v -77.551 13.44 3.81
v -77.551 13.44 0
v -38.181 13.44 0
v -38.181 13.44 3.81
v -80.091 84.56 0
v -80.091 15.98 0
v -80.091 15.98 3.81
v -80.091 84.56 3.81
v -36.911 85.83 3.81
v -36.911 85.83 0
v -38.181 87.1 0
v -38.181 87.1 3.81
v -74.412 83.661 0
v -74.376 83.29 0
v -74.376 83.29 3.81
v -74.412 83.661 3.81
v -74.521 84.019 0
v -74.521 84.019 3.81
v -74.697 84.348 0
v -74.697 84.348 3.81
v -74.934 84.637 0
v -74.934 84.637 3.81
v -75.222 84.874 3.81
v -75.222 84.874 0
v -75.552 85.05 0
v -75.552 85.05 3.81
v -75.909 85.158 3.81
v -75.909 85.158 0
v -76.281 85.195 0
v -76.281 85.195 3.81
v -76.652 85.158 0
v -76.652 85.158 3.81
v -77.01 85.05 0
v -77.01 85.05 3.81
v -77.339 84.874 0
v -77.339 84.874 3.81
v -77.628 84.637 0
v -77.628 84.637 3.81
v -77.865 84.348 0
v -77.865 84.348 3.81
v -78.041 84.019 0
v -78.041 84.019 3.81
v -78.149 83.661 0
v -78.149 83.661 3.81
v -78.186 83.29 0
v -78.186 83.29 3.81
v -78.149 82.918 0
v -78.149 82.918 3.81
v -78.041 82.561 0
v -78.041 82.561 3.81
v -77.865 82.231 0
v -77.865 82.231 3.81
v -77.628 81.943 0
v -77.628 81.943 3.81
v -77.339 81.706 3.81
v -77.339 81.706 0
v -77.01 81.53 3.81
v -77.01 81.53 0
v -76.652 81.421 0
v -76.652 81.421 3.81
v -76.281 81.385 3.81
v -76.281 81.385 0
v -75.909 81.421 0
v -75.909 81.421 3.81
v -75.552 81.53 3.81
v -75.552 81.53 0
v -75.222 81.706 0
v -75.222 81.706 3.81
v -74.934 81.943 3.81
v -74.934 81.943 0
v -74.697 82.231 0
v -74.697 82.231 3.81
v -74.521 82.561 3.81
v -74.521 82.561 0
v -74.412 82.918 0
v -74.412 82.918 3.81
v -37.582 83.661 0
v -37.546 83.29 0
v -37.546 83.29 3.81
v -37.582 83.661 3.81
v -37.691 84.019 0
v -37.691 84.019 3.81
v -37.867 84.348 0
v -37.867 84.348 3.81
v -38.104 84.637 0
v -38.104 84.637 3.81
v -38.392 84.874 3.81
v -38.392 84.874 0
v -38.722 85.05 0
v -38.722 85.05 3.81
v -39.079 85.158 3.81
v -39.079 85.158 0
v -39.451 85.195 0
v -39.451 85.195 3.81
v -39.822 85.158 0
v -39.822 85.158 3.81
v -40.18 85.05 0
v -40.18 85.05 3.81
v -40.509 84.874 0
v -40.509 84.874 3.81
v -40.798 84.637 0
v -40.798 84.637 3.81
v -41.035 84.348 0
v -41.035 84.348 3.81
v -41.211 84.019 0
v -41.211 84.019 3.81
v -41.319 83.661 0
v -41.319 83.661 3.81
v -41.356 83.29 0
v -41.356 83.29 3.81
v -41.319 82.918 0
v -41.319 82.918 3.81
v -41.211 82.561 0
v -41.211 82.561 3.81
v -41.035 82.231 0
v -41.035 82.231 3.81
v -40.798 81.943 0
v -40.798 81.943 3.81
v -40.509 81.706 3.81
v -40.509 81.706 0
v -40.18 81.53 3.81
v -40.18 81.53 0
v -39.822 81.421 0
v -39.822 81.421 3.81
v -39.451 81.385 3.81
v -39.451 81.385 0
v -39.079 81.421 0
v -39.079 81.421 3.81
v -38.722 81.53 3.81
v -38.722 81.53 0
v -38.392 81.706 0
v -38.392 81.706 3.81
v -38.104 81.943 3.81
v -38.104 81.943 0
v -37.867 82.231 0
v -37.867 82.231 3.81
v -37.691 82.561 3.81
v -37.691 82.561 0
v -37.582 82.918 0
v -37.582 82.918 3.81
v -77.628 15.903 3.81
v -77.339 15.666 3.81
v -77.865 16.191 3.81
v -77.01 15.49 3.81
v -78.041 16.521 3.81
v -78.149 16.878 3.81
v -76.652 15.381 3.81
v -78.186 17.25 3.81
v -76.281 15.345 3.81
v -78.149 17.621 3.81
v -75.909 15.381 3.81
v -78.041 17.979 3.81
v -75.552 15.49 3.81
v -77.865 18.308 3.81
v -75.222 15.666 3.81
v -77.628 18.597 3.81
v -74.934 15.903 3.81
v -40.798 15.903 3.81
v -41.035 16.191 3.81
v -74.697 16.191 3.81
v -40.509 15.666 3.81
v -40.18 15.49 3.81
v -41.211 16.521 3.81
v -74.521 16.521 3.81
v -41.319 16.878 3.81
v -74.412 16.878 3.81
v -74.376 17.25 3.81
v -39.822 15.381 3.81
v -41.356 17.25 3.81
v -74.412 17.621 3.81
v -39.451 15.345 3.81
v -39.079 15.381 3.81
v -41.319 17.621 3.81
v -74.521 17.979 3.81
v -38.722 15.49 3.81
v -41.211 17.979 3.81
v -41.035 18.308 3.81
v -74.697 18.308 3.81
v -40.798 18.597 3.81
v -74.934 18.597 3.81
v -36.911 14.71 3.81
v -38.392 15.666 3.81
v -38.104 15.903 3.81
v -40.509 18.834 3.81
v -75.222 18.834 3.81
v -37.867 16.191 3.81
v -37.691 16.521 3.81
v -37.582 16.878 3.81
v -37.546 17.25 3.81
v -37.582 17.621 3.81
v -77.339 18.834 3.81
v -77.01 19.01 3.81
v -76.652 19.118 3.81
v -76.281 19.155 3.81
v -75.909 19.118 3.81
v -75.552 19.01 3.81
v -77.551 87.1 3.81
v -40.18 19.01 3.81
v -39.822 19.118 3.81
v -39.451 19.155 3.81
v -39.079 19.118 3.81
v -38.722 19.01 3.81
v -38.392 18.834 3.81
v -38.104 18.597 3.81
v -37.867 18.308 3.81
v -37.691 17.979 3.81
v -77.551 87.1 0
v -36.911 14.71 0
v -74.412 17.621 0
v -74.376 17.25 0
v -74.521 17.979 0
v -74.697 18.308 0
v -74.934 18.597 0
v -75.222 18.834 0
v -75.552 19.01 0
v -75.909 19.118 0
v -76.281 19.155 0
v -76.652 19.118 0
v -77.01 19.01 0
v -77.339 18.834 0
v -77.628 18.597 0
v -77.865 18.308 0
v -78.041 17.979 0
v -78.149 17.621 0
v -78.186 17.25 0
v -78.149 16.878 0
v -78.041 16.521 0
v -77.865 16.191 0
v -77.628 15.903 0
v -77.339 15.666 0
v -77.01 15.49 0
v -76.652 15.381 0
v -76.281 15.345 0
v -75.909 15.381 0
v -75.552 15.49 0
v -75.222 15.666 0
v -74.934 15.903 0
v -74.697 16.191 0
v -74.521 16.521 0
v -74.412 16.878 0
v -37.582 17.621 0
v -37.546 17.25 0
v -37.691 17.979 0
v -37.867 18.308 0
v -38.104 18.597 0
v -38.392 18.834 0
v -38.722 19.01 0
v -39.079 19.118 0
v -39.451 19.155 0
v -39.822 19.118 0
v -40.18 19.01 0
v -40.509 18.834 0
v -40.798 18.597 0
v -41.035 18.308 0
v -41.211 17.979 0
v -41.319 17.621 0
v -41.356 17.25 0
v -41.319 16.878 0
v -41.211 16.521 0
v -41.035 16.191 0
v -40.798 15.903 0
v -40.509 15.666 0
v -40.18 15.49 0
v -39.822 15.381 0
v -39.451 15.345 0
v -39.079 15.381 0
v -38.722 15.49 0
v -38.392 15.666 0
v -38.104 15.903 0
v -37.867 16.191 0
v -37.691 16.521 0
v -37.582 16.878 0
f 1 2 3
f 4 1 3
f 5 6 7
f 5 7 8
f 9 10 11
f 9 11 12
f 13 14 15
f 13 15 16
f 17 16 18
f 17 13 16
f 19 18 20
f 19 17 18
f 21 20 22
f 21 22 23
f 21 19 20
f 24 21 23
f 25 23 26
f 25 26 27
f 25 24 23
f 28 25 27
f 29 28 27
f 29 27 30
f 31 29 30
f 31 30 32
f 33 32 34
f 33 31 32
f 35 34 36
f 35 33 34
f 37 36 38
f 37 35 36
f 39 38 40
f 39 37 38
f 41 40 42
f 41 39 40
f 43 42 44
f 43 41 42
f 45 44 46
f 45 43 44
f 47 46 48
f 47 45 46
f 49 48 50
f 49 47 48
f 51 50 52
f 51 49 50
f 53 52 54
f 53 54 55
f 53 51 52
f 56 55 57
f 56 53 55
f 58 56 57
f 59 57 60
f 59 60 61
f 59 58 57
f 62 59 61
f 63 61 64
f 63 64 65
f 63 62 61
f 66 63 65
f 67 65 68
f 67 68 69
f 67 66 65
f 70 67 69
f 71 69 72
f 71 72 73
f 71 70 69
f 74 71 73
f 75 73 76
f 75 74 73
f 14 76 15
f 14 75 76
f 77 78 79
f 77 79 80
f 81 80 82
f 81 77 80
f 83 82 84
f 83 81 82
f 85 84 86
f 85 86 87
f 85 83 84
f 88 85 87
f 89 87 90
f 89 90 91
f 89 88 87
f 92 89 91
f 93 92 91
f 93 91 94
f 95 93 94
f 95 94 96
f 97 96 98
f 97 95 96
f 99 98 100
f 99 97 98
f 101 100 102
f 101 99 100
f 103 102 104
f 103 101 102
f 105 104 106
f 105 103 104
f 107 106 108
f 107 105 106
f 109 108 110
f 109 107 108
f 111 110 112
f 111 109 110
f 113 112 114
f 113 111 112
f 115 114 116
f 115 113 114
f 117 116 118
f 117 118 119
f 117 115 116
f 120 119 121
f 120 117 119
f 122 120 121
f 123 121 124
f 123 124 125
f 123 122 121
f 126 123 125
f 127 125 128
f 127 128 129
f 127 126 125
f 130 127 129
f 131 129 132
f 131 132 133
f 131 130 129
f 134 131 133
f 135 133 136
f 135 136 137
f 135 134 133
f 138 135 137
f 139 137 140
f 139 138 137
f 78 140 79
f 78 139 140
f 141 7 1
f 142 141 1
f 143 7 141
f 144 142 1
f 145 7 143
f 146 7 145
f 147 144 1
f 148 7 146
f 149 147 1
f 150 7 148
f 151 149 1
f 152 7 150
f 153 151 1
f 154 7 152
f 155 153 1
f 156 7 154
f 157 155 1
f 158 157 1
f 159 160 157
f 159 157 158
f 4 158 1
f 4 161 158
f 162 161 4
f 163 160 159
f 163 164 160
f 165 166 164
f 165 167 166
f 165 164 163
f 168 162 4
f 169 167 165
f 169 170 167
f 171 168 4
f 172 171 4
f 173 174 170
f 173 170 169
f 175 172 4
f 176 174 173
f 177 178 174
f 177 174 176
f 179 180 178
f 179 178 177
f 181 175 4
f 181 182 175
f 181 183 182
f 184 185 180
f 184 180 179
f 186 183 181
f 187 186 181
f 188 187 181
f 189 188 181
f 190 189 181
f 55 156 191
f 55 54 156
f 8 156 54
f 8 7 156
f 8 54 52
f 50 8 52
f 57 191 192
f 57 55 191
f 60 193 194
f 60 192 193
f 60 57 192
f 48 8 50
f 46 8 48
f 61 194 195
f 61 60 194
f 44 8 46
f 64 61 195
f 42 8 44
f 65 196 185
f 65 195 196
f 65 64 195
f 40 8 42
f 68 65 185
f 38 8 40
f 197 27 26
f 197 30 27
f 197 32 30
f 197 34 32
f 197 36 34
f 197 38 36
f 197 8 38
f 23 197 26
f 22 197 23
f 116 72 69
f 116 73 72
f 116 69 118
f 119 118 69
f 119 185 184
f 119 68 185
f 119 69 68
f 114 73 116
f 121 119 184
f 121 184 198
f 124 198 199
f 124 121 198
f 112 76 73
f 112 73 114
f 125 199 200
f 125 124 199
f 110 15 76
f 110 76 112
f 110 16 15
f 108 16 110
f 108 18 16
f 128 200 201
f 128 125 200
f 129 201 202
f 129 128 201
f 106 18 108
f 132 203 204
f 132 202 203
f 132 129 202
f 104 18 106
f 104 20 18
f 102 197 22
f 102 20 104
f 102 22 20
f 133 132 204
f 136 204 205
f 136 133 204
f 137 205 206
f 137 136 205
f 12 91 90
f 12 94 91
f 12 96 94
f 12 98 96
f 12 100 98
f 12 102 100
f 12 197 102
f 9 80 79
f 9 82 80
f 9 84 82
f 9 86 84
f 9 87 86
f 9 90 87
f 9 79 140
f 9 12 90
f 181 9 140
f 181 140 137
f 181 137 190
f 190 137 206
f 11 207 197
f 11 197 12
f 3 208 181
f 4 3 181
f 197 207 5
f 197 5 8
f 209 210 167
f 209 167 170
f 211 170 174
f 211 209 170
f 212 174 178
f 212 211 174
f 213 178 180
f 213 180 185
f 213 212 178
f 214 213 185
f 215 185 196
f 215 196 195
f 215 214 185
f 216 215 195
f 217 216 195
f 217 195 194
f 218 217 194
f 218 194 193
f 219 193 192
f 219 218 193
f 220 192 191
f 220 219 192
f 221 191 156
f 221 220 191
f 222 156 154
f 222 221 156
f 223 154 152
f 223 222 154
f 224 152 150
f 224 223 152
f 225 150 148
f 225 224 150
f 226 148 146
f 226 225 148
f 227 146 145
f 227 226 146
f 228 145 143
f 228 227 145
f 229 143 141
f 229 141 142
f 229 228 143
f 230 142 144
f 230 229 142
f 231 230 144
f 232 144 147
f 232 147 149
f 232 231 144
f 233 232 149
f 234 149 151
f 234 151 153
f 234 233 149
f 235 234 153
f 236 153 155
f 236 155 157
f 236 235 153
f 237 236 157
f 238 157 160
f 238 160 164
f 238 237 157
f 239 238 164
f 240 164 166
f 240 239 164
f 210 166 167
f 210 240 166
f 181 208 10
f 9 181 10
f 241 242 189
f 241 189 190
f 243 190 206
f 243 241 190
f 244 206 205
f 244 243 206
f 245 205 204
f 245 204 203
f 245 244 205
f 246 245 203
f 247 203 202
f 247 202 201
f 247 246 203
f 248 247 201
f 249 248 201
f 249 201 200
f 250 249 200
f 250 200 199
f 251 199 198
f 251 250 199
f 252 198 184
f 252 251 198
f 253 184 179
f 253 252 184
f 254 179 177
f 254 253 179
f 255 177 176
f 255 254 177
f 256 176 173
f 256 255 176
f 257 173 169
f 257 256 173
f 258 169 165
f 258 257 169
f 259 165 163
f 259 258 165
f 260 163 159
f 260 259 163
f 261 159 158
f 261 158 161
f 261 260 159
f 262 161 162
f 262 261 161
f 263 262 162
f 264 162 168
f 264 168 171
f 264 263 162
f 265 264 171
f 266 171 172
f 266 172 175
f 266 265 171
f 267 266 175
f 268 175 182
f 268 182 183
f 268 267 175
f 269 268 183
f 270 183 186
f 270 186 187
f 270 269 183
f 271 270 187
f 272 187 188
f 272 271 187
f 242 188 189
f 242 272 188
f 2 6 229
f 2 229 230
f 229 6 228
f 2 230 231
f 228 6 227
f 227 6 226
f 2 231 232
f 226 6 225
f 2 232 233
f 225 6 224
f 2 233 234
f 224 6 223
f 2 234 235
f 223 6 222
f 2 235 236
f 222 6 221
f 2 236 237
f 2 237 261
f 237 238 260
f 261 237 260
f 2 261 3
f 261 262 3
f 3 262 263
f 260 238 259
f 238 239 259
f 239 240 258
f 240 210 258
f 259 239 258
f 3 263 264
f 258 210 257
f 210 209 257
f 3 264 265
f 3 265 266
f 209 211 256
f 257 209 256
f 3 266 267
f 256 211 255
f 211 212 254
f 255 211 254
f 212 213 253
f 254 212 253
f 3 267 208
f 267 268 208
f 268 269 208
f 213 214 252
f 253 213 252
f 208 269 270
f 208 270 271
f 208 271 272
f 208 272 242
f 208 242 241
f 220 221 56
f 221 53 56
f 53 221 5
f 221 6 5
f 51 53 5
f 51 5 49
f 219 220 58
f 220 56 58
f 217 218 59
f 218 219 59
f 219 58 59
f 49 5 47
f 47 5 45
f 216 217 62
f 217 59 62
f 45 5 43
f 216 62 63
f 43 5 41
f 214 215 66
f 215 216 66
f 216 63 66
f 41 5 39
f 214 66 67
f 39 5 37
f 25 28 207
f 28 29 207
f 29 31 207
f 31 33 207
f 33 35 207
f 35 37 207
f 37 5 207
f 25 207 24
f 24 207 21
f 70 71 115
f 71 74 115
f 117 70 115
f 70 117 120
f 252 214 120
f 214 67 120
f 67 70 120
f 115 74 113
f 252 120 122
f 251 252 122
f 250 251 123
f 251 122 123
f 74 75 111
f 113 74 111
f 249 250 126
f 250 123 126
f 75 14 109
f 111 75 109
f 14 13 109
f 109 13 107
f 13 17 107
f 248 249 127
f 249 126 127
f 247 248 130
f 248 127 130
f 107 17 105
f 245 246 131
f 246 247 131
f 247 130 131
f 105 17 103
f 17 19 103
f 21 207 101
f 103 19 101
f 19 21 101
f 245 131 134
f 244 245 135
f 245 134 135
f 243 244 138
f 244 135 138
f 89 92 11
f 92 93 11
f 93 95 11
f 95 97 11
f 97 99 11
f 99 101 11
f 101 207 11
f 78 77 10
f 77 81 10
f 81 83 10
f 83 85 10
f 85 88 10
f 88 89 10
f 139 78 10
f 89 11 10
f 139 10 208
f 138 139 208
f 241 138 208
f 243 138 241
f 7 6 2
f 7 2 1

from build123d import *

# Parameters (mm, degrees)
F0_W     = 43.18
F0_H     = 73.66
F0_R     = 1.905
F1_DEPTH = 3.81
F2_SIZE  = 1.27
F3_SIZE  = 2.54


with BuildPart() as f1:
    # F0 (on Top) → F1 (new body)
    with BuildSketch(Plane.XY):
        with Locations((-58.500675, 50.269581)):
            Rectangle(F0_W, F0_H)
        with Locations((-76.280675, 17.249581)):
            Circle(F0_R, mode=Mode.SUBTRACT)
        with Locations((-39.450675, 17.249581)):
            Circle(F0_R, mode=Mode.SUBTRACT)
        with Locations((-76.280675, 83.289581)):
            Circle(F0_R, mode=Mode.SUBTRACT)
        with Locations((-39.450675, 83.289581)):
            Circle(F0_R, mode=Mode.SUBTRACT)
    extrude(amount=F1_DEPTH)

    # F2
    f2_edges = [f1.edges().sort_by_distance(p)[0] for p in [
        (-36.910675, 13.439581, 1.905),
        (-36.910675, 87.099581, 1.905),
    ]]
    chamfer(f2_edges, length=F2_SIZE)

    # F3
    f3_edges = [f1.edges().sort_by_distance(p)[0] for p in [
        (-80.090675, 13.439581, 1.905),
        (-80.090675, 87.099581, 1.905),
    ]]
    chamfer(f3_edges, length=F3_SIZE)


solid = f1.part
